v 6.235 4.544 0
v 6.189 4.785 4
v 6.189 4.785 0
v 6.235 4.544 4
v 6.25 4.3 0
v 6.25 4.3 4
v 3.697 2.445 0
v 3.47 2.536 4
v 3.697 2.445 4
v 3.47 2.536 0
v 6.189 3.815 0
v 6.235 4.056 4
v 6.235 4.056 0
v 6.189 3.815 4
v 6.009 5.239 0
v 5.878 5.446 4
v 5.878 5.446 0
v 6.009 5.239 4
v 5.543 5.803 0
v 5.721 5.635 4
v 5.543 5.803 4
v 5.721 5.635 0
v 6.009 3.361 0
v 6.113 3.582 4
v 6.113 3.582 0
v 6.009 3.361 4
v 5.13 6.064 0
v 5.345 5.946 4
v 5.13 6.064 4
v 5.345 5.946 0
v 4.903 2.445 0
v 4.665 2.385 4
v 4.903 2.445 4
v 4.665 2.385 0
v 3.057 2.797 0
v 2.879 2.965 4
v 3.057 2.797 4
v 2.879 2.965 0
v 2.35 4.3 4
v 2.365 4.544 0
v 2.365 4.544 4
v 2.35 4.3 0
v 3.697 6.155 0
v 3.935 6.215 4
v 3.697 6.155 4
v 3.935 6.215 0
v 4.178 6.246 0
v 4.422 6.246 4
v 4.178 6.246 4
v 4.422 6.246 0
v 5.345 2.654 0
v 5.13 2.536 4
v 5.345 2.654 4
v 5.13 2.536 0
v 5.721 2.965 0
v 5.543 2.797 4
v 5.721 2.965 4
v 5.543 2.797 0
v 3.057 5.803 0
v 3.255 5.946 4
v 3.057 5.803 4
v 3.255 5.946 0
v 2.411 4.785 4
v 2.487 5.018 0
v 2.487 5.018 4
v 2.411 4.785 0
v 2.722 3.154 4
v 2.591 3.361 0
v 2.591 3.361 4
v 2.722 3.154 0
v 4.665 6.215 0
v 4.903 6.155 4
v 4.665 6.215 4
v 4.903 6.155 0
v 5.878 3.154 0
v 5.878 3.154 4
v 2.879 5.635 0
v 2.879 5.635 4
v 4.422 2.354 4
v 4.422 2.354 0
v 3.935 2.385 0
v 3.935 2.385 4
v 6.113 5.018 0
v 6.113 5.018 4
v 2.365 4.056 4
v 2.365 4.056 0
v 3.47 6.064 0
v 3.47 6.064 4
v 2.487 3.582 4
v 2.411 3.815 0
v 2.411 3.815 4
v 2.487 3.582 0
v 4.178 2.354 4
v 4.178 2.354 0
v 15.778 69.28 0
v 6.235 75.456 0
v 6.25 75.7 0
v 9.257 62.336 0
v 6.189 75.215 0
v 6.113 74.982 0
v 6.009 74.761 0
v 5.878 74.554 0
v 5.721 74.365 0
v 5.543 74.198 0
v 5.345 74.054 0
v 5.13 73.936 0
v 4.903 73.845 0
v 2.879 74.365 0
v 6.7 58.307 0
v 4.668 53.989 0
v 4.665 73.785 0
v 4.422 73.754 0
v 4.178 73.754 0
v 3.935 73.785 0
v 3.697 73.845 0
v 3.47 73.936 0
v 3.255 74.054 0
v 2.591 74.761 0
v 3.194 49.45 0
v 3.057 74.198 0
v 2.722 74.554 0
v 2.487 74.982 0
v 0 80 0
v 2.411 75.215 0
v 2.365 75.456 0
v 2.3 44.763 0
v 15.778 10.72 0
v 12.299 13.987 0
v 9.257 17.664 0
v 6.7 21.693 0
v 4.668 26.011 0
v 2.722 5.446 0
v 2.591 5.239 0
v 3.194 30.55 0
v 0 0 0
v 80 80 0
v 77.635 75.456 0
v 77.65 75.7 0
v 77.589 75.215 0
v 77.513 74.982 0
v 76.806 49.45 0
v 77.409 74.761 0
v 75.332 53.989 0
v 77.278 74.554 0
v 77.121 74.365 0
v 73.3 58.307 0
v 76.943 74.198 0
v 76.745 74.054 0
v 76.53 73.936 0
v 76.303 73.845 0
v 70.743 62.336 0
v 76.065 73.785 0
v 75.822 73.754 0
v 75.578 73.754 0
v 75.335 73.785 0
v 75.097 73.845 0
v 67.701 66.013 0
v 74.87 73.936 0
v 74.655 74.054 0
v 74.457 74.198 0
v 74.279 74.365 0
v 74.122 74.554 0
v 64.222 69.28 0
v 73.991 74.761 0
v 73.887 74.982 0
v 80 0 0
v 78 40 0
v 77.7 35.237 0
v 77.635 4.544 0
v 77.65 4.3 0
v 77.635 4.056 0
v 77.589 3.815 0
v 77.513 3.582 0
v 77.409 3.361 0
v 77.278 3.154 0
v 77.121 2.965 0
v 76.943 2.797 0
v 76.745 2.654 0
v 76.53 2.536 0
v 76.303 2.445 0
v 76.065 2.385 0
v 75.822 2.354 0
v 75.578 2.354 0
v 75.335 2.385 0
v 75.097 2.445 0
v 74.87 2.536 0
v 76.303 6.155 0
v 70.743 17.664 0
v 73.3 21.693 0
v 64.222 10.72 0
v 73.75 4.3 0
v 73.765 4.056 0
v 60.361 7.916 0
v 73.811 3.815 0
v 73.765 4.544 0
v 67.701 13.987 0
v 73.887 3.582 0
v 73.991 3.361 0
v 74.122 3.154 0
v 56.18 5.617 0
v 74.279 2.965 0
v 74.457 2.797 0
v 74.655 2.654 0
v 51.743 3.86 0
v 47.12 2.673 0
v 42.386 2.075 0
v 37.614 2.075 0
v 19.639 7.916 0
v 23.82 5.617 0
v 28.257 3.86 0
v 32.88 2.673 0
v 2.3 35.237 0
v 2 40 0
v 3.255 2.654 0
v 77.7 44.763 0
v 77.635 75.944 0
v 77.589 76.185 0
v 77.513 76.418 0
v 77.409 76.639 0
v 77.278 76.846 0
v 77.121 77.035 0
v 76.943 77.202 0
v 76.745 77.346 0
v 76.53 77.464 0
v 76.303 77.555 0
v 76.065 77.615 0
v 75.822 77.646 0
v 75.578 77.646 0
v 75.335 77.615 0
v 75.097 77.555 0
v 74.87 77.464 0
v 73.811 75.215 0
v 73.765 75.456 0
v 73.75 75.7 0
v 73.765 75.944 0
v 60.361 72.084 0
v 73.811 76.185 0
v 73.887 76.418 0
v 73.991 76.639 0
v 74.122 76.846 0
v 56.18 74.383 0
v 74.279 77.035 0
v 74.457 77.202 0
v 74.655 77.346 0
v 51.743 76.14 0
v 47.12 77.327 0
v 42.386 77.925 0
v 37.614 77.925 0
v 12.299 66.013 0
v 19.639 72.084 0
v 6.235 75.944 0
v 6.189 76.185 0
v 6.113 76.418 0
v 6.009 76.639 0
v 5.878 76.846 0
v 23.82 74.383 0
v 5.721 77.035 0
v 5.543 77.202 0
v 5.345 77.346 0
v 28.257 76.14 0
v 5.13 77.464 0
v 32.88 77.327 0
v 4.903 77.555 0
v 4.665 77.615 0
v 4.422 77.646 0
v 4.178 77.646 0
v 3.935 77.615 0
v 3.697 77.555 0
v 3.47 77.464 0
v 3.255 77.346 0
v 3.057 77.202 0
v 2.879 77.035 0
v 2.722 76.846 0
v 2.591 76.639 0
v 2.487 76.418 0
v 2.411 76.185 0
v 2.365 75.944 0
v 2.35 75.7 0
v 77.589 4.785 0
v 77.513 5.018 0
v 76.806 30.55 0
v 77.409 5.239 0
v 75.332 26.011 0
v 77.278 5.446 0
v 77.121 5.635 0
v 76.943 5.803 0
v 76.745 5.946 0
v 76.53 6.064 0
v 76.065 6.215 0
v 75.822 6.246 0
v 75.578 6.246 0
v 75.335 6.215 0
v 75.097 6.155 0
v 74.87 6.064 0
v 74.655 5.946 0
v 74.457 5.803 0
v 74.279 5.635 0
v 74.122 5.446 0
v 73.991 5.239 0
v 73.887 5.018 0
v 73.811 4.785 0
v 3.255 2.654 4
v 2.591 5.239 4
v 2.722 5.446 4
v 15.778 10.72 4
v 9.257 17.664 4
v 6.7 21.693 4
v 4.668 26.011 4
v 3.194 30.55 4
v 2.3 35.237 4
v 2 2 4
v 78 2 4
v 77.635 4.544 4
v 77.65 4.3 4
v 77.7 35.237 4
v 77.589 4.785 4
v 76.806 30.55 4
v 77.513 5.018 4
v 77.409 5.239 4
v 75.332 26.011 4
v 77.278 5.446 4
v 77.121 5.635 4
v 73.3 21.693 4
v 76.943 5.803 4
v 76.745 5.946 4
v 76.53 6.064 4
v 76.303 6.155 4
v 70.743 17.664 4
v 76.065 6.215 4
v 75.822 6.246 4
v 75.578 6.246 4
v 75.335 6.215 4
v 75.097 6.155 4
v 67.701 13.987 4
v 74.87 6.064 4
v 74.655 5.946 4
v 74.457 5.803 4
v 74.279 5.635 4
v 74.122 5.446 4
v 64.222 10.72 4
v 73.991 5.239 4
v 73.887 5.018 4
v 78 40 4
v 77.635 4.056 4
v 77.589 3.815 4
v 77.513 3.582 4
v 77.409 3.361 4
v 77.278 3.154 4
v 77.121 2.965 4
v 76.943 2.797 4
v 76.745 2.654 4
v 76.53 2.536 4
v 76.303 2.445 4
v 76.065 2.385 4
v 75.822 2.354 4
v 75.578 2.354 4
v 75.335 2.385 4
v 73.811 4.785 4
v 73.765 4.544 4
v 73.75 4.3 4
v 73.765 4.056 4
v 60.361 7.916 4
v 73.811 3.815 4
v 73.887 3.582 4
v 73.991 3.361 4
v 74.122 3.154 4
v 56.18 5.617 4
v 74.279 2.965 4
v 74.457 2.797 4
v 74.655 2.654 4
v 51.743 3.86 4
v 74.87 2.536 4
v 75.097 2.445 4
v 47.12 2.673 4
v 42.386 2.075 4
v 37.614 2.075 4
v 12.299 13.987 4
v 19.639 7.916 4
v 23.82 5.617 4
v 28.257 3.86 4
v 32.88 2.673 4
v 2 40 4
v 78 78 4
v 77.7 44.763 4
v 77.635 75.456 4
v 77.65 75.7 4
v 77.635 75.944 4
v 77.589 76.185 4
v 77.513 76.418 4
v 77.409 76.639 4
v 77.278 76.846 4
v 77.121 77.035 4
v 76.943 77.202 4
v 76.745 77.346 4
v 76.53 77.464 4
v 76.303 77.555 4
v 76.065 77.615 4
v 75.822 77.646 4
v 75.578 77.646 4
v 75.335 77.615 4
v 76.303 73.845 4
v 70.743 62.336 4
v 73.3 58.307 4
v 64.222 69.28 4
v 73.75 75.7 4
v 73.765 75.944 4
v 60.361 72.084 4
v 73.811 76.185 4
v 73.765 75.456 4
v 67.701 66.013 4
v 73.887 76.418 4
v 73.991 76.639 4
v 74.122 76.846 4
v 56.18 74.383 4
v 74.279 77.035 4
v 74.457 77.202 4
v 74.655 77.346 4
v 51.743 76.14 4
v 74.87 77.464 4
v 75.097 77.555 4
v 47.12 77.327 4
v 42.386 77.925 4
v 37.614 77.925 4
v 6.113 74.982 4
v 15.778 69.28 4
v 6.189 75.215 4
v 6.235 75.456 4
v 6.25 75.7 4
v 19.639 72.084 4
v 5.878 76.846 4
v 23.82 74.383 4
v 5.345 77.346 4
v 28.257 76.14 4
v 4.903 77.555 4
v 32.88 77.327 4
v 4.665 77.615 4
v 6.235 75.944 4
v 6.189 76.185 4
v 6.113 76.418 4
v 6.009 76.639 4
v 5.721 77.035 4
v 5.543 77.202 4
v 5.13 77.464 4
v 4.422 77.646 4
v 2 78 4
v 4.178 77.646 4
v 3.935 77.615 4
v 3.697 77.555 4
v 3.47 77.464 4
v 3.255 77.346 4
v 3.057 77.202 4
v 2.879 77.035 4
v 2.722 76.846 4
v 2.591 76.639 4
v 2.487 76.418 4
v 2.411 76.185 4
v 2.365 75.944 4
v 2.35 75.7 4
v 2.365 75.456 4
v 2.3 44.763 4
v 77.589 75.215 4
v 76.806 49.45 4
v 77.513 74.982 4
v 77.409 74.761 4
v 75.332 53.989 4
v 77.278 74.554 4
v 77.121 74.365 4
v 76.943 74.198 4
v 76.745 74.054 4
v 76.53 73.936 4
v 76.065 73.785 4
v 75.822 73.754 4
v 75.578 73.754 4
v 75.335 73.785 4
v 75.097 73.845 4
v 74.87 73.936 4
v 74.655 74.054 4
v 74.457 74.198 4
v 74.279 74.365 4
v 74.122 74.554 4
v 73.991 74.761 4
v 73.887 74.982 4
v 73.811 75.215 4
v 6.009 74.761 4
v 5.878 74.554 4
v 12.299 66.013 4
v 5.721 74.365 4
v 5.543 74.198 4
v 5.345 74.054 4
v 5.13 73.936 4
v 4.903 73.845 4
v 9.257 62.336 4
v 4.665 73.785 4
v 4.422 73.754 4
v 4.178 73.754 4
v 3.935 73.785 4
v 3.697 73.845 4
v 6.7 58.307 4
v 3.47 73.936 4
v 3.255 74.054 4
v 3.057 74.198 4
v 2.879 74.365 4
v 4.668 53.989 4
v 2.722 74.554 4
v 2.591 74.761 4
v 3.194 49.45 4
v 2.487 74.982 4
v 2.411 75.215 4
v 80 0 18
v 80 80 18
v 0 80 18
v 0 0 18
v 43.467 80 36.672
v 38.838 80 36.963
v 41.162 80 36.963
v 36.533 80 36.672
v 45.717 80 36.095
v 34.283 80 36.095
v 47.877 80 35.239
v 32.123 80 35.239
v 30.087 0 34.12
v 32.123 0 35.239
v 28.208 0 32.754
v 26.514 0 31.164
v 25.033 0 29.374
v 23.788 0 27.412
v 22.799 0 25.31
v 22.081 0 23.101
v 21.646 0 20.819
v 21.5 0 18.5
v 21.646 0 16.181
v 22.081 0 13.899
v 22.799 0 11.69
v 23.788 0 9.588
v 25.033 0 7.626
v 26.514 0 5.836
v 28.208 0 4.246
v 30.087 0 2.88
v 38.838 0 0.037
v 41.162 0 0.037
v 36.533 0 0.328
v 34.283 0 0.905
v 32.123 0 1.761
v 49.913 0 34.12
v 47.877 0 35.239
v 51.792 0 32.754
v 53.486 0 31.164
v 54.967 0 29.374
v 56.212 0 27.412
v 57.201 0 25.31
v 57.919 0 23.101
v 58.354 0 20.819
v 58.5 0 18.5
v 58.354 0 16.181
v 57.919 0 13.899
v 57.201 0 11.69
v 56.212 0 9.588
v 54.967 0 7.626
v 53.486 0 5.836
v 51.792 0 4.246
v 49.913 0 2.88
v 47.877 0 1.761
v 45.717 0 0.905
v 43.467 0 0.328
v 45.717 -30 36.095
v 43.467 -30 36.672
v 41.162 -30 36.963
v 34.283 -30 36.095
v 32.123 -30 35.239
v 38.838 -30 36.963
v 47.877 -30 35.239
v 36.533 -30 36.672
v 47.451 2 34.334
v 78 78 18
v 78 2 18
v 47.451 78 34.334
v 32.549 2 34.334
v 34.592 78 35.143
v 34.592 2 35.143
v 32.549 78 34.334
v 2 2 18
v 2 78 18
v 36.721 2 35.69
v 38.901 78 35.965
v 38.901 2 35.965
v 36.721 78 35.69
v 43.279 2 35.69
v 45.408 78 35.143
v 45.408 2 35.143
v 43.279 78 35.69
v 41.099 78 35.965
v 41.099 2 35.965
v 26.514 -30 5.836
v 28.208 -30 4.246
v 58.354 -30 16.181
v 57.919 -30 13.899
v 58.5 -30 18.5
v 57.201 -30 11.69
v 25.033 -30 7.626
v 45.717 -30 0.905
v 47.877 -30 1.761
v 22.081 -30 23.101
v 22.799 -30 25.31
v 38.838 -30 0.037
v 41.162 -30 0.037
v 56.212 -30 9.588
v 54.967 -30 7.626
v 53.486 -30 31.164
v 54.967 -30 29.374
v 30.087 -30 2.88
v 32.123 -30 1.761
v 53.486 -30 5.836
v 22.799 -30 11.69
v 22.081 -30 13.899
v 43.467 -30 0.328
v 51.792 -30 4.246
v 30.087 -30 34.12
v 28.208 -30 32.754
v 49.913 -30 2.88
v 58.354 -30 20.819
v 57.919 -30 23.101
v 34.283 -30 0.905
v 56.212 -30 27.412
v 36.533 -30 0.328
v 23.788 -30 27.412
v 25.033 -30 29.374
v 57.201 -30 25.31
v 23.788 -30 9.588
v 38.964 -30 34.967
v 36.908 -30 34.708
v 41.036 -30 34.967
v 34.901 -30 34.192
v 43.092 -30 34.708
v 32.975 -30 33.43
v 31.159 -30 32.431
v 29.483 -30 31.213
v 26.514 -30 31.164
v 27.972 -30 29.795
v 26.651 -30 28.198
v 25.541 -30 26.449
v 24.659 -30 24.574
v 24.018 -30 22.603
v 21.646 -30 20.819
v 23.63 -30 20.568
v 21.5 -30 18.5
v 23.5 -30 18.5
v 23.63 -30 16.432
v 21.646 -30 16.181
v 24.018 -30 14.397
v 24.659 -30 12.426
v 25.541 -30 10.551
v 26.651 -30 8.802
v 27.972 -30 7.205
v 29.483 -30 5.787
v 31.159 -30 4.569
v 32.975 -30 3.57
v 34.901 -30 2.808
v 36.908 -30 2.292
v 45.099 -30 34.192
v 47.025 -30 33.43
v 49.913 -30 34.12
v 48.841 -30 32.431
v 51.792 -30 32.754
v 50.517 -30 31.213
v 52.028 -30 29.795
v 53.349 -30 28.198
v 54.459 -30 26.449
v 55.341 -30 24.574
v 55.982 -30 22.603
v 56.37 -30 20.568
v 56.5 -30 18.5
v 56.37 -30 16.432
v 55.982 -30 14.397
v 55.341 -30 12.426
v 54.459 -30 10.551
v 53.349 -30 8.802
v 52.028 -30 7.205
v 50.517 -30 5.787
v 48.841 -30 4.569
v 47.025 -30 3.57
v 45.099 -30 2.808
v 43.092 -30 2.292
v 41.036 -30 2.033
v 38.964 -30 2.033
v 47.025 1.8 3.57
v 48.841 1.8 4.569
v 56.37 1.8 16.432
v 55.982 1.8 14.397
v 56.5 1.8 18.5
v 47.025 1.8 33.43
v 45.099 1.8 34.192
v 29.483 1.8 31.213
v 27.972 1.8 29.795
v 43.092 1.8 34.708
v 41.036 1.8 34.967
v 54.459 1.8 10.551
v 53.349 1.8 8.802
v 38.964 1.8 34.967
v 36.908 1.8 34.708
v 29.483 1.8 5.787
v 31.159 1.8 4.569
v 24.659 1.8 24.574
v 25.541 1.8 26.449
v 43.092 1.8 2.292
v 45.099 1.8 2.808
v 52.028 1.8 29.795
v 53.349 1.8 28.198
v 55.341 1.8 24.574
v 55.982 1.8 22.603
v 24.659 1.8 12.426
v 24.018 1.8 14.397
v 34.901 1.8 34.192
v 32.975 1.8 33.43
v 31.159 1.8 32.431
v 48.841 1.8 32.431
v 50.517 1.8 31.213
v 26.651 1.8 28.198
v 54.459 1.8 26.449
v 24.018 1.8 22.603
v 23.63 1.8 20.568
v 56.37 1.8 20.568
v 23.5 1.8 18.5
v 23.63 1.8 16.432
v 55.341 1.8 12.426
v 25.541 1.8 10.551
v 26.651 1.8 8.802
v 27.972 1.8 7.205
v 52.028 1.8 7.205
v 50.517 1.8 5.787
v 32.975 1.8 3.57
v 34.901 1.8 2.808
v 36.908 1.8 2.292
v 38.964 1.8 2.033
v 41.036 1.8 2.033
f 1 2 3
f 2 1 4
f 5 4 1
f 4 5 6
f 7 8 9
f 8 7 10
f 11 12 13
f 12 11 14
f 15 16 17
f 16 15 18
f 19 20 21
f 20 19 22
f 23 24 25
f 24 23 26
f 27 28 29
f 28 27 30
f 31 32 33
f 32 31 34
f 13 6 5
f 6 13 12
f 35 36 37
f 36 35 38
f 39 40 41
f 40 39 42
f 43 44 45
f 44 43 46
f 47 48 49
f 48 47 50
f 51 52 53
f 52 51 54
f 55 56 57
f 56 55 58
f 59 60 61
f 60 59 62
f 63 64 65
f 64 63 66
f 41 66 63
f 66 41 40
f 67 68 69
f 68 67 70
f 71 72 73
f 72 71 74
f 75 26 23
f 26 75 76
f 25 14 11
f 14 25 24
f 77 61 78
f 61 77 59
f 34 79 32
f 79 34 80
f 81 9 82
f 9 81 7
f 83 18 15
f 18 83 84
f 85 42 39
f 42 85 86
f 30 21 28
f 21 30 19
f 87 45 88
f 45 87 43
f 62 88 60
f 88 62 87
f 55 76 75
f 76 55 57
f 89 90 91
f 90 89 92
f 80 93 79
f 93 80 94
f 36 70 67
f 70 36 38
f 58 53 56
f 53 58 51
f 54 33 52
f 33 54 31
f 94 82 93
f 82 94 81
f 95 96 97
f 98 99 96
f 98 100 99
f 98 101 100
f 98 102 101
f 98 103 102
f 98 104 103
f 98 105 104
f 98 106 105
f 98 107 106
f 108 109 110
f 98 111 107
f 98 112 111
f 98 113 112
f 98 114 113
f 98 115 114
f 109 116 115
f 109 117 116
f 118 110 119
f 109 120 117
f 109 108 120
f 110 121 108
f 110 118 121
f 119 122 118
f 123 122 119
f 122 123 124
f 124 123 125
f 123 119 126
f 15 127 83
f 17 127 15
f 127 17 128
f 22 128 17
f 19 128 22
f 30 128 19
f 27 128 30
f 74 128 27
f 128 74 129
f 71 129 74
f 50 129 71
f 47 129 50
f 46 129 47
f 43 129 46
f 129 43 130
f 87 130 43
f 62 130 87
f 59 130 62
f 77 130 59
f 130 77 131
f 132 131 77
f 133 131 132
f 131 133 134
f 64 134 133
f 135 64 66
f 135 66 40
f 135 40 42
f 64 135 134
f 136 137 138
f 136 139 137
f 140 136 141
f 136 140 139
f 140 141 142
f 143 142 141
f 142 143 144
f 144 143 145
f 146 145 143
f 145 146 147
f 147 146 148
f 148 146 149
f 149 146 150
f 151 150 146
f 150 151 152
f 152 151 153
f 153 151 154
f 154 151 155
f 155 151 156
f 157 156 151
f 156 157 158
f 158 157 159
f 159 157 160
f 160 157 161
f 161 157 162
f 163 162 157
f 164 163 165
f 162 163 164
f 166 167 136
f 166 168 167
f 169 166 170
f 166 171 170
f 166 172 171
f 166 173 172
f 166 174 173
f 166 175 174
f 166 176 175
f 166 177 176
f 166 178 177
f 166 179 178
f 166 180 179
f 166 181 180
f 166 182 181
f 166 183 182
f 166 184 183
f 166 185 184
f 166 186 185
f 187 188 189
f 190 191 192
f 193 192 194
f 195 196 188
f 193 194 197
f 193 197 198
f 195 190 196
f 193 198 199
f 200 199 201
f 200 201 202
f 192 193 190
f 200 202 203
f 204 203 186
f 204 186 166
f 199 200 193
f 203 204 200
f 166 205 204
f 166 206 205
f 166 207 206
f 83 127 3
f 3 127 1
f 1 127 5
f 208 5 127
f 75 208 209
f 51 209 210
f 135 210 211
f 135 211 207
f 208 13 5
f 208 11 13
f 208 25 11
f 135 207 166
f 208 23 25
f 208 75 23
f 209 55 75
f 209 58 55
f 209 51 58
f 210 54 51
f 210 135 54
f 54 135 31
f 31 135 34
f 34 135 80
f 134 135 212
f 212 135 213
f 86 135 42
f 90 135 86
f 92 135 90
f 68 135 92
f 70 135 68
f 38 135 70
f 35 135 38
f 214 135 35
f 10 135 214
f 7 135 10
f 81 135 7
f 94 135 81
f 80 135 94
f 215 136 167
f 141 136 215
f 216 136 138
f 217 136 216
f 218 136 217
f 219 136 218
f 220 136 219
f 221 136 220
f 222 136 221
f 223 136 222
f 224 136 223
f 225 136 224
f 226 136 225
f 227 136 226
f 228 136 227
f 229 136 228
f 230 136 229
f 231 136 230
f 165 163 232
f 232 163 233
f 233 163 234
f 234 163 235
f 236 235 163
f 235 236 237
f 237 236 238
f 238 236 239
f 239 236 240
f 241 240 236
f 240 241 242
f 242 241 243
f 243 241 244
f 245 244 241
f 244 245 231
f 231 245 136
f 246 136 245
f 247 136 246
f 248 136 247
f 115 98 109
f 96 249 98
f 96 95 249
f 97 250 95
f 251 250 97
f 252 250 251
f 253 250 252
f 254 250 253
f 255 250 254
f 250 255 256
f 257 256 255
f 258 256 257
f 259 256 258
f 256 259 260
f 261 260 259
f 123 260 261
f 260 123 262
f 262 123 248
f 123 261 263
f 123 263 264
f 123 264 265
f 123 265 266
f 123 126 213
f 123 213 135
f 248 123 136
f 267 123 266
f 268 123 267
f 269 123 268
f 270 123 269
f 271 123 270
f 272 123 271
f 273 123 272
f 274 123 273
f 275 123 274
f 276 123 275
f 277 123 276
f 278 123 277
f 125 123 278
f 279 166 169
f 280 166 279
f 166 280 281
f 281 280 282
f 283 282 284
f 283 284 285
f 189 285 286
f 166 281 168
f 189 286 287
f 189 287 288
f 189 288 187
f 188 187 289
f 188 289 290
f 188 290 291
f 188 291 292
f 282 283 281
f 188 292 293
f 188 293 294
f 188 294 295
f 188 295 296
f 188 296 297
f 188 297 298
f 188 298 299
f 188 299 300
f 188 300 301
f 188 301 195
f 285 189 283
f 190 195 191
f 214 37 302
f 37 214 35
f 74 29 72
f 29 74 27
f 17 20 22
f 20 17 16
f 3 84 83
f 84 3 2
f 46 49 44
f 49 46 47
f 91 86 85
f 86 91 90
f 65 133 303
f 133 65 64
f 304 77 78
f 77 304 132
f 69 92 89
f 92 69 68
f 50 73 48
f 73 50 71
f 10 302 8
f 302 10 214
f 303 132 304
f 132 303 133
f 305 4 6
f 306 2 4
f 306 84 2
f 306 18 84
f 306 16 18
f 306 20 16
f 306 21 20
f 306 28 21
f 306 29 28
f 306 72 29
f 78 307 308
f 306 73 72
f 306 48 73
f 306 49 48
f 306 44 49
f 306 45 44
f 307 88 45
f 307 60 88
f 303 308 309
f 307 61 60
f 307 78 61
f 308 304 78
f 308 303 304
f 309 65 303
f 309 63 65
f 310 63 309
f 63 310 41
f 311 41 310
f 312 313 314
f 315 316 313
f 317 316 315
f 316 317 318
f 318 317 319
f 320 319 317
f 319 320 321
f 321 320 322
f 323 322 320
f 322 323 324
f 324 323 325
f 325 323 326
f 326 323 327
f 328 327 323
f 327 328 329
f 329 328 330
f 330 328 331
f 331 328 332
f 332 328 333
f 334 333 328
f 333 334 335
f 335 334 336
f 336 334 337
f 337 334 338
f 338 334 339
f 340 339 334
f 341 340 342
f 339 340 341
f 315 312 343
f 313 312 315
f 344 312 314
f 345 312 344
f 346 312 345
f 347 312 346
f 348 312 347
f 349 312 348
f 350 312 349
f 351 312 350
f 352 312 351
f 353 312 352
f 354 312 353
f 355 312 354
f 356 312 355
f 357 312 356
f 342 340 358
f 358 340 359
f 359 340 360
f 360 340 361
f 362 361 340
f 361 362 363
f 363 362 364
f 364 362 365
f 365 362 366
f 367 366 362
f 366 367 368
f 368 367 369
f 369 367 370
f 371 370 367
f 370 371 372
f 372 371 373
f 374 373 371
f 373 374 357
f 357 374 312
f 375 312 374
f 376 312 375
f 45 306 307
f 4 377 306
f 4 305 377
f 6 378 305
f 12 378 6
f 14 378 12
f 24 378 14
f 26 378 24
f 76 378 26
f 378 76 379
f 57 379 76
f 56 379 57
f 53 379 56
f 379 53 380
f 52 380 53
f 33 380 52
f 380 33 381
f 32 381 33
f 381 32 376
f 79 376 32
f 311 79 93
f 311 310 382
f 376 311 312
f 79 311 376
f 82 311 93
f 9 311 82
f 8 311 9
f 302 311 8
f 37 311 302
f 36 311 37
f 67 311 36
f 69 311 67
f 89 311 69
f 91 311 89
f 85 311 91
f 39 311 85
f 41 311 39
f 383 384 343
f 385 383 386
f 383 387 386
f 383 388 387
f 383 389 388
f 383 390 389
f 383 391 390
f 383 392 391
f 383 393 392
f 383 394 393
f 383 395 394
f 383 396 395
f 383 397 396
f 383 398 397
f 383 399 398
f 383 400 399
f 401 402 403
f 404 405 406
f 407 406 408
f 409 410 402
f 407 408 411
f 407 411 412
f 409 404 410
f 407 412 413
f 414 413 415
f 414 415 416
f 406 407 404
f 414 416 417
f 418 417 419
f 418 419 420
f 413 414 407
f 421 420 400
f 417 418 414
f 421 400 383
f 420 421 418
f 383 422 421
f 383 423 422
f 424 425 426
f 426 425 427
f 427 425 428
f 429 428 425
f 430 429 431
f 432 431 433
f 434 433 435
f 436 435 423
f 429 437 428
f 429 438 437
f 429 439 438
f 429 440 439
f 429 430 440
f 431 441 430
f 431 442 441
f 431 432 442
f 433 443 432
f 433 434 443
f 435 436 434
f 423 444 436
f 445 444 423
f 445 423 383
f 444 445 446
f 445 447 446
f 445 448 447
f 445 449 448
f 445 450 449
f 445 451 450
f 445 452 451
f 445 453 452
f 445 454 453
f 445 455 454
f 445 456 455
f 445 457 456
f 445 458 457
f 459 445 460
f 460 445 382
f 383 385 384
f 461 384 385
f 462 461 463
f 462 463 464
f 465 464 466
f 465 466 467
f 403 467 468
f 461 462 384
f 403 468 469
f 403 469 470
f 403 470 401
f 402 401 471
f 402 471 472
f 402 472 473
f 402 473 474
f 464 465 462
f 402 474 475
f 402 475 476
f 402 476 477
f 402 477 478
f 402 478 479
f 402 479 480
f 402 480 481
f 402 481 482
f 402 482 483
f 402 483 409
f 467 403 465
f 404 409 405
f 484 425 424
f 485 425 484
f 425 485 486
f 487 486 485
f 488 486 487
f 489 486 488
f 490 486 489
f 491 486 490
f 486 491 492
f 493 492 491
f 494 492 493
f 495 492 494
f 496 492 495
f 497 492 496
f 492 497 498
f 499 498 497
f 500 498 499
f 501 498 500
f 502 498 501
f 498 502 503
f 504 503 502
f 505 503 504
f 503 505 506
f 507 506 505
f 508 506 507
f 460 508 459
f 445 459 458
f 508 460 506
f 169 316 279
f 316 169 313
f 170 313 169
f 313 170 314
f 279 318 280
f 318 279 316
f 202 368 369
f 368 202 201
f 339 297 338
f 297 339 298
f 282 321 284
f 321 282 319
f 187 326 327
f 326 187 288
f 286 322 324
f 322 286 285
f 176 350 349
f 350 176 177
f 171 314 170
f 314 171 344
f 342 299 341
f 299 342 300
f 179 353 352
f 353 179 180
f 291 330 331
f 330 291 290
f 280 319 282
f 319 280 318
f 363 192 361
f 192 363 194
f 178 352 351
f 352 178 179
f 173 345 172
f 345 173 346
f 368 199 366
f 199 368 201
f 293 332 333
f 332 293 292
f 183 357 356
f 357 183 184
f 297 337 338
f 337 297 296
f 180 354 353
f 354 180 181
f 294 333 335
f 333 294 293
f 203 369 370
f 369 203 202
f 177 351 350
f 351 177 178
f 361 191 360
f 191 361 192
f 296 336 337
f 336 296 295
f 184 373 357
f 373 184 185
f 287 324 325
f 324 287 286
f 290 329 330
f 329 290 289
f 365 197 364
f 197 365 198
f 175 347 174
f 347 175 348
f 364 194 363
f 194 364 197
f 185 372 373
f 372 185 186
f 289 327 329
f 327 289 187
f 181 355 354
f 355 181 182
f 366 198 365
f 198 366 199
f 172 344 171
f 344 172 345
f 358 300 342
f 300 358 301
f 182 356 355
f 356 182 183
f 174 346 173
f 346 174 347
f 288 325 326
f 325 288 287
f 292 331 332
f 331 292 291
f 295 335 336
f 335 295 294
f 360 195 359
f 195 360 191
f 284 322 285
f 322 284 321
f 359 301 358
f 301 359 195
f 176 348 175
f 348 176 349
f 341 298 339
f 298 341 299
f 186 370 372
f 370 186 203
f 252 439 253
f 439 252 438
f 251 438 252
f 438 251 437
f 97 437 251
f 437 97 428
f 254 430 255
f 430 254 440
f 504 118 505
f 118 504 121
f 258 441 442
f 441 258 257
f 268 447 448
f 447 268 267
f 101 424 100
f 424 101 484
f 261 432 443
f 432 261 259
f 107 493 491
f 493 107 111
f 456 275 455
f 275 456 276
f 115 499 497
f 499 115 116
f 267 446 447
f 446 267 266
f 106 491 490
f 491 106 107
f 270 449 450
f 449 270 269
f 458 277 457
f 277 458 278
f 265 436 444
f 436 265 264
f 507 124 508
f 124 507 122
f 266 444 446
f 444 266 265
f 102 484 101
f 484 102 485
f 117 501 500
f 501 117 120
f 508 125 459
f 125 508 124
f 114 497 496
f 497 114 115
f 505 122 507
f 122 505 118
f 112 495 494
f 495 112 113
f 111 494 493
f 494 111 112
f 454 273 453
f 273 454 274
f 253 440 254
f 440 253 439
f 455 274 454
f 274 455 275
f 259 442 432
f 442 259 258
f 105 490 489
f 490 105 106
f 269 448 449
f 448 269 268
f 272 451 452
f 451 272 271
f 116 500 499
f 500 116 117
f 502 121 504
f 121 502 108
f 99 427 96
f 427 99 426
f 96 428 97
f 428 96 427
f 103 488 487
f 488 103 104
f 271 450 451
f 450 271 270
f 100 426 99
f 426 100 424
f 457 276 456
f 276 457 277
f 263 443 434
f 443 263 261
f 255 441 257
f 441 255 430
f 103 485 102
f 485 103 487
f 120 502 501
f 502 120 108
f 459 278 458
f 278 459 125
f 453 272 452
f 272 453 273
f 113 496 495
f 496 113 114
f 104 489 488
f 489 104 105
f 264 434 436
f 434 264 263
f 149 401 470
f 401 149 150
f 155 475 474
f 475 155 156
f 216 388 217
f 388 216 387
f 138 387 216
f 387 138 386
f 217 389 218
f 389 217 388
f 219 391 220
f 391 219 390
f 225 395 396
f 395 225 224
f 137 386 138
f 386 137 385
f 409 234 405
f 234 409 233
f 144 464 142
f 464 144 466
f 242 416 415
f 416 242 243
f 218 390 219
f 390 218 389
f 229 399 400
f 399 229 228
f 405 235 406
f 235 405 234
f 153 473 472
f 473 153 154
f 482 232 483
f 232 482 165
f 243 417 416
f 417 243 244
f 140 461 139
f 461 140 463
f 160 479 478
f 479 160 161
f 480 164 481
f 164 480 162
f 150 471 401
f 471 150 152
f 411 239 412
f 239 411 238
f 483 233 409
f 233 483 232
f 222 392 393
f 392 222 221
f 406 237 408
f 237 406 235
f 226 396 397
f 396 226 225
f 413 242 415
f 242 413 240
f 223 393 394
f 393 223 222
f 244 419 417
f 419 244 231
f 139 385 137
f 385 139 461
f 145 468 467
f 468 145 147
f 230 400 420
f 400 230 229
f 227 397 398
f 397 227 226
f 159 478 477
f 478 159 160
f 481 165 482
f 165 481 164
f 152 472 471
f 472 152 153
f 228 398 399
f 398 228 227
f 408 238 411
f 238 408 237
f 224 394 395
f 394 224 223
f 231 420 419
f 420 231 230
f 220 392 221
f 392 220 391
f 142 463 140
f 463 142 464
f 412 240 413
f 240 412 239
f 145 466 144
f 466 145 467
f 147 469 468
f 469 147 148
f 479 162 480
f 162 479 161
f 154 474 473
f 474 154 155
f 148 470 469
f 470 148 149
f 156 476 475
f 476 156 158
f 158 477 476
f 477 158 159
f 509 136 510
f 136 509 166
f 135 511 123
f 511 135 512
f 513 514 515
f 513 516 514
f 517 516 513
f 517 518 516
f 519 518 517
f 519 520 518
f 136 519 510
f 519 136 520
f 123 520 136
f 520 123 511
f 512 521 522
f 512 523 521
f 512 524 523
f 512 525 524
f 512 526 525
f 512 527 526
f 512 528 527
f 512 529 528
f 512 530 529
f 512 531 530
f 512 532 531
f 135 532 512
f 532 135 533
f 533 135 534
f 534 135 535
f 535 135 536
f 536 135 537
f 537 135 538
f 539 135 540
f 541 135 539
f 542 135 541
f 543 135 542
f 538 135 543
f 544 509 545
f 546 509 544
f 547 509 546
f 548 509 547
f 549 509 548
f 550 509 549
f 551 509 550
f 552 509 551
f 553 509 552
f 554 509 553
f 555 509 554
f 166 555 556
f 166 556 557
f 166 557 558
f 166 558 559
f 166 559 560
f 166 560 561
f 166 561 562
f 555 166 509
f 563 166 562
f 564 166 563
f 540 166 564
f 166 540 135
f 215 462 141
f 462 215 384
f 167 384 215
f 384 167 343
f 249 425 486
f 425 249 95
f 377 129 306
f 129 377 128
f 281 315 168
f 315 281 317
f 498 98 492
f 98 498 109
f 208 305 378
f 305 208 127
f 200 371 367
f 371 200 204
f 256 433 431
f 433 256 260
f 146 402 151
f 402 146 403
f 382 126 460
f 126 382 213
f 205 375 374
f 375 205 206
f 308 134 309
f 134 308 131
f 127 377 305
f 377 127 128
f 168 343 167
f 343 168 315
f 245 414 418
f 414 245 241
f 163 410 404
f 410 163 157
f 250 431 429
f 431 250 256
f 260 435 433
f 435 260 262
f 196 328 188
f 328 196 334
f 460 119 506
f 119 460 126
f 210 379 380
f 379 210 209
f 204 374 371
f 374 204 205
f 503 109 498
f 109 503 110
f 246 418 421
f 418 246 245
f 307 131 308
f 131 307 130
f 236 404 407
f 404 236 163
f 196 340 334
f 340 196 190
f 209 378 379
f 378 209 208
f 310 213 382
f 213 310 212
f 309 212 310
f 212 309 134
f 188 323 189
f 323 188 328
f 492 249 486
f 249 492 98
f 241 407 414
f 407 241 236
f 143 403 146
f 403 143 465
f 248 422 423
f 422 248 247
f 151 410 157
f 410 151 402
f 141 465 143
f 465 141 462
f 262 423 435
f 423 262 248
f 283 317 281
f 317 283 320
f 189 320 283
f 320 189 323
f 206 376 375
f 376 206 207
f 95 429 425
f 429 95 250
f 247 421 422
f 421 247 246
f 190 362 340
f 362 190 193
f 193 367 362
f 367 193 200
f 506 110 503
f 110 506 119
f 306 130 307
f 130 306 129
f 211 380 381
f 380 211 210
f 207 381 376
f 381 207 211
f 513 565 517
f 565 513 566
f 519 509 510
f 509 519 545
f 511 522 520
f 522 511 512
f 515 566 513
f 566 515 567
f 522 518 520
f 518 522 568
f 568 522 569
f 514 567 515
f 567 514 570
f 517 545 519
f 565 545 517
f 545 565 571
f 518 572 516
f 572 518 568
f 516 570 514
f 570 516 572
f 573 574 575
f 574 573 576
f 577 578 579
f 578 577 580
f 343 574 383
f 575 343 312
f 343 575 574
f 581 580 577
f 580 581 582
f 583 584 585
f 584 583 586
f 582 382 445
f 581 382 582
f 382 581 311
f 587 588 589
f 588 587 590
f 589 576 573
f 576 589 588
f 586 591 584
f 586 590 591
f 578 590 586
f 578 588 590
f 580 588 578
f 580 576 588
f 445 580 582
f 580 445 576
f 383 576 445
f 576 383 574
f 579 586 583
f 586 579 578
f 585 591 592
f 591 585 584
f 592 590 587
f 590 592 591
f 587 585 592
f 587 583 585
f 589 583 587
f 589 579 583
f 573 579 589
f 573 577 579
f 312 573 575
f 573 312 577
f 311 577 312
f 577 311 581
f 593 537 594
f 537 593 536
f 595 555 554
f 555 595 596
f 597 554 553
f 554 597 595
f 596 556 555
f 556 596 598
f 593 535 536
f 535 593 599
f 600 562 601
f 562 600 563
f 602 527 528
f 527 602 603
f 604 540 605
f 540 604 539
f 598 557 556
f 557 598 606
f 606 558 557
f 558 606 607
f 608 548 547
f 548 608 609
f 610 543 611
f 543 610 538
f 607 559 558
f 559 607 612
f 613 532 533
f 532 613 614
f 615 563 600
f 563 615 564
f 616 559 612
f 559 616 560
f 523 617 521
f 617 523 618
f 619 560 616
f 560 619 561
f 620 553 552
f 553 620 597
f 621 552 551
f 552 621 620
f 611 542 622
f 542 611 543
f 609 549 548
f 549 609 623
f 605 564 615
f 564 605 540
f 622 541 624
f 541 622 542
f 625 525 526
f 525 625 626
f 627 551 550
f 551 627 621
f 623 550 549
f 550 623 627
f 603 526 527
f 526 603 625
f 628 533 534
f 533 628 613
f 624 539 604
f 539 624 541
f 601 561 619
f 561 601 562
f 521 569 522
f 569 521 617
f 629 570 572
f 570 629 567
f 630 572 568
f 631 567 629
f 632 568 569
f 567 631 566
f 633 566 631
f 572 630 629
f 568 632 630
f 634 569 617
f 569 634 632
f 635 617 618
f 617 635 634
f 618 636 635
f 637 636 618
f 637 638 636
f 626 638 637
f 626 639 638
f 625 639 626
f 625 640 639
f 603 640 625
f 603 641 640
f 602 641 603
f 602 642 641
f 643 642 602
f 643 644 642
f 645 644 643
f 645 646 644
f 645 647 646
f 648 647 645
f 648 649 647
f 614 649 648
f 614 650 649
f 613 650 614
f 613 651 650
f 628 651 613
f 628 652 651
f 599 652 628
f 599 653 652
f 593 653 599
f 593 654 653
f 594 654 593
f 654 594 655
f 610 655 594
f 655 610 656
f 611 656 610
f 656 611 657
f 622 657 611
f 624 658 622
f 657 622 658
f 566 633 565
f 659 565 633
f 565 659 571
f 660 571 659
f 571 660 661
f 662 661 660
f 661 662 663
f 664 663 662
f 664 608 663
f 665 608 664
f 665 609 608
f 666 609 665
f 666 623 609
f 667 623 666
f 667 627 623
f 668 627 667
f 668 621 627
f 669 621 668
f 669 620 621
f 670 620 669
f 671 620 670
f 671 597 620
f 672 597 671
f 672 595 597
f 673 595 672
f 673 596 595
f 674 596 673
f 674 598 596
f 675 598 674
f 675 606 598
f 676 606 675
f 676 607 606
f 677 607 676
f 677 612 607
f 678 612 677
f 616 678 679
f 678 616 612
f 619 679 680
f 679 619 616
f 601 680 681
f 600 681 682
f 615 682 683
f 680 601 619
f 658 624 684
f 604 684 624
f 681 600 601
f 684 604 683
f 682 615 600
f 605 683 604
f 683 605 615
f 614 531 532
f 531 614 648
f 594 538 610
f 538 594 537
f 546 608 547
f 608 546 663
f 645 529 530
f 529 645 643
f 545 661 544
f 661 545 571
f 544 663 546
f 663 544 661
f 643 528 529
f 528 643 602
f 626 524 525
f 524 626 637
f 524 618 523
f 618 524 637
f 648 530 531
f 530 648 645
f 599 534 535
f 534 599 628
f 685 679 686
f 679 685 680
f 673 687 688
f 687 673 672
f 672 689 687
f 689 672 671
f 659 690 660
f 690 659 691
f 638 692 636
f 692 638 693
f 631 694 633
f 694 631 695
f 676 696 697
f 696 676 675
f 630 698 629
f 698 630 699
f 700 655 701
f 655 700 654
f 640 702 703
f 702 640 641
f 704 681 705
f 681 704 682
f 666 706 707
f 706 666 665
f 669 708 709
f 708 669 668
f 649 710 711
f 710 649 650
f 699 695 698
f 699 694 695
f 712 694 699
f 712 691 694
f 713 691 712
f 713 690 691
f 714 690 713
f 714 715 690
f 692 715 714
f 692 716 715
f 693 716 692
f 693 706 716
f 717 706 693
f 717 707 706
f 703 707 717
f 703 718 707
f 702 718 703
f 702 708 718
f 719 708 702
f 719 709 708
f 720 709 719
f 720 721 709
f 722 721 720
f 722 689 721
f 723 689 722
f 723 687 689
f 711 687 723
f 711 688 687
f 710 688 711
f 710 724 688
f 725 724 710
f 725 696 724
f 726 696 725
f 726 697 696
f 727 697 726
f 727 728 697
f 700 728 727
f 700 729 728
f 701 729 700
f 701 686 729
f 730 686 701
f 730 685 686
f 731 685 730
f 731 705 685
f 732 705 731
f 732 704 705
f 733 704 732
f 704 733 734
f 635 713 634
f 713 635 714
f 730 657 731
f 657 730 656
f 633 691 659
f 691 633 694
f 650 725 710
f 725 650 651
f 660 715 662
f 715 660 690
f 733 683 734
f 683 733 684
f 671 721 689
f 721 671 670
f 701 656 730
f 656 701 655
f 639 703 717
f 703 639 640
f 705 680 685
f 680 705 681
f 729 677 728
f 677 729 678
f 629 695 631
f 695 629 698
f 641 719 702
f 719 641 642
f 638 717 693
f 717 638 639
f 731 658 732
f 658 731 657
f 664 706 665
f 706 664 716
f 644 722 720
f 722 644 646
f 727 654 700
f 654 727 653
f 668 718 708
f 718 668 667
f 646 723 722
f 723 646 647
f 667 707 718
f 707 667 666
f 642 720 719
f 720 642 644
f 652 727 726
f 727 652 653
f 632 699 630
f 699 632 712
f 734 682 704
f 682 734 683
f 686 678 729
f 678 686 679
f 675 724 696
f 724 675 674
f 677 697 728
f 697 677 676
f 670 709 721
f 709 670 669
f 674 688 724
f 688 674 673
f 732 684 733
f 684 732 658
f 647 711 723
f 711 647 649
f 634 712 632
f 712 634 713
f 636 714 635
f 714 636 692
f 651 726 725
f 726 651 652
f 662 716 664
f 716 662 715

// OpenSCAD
$fn=50;

layerHeigth=0.2;

fanXY=80;
fanZ=18;

cutoutHoleDia=37; /* set diameter of necessaty blowout hole */
cutoutHoleR=cutoutHoleDia/2;
cutoutTubeLen=30;
wallThickness=2;

screwR=1.95;
screwDistance=71.4;
fanHole=76;
frontPlateThickness=4;

module noctua80screwHoles()
{
  cylinder(r=screwR, h=frontPlateThickness, center=false);
  translate([screwDistance,0,0]) cylinder(r=screwR, h=frontPlateThickness, center=false);
  translate([0,screwDistance,0]) cylinder(r=screwR, h=frontPlateThickness, center=false);
  translate([screwDistance,screwDistance,0]) cylinder(r=screwR, h=frontPlateThickness, center=false);
}

/* translate([(fanXY-screwDistance)/2,(fanXY-screwDistance)/2,0])
noctua80screwHoles(); */

module noctua80()
{
  difference() {
    cube([fanXY,fanXY,frontPlateThickness]);

    translate([fanXY/2,fanXY/2,0])
      cylinder(r=fanHole/2, h=frontPlateThickness, center=false);

    translate([(fanXY-screwDistance)/2,(fanXY-screwDistance)/2,0])
      noctua80screwHoles();
  }
}

/* noctua80(); */


module fanOut()
{

  difference() {
    union()
    {
      noctua80();
      difference() {
        hull()
        {
          cube([fanXY,fanXY,fanZ]);
          translate([fanXY/2,0,cutoutHoleR]) rotate([-90,0,0]) cylinder(r=cutoutHoleR,h=fanXY);
        }
        hull()
        {
          translate([wallThickness,wallThickness,0]) cube([fanXY-wallThickness*2,fanXY-wallThickness*2,fanZ]);
          translate([fanXY/2,wallThickness,cutoutHoleR]) rotate([-90,0,0]) cylinder(r=cutoutHoleR-wallThickness/2,h=fanXY-wallThickness*2);

        }
      }
      translate([fanXY/2,-cutoutTubeLen,cutoutHoleR]) rotate([-90,0,0]) cylinder(r=cutoutHoleR,h=cutoutTubeLen);
    }
    translate([fanXY/2,-cutoutTubeLen,cutoutHoleR]) rotate([-90,0,0]) cylinder(r=cutoutHoleR-wallThickness,h=cutoutTubeLen+wallThickness-layerHeigth);
  }
}

fanOut();
